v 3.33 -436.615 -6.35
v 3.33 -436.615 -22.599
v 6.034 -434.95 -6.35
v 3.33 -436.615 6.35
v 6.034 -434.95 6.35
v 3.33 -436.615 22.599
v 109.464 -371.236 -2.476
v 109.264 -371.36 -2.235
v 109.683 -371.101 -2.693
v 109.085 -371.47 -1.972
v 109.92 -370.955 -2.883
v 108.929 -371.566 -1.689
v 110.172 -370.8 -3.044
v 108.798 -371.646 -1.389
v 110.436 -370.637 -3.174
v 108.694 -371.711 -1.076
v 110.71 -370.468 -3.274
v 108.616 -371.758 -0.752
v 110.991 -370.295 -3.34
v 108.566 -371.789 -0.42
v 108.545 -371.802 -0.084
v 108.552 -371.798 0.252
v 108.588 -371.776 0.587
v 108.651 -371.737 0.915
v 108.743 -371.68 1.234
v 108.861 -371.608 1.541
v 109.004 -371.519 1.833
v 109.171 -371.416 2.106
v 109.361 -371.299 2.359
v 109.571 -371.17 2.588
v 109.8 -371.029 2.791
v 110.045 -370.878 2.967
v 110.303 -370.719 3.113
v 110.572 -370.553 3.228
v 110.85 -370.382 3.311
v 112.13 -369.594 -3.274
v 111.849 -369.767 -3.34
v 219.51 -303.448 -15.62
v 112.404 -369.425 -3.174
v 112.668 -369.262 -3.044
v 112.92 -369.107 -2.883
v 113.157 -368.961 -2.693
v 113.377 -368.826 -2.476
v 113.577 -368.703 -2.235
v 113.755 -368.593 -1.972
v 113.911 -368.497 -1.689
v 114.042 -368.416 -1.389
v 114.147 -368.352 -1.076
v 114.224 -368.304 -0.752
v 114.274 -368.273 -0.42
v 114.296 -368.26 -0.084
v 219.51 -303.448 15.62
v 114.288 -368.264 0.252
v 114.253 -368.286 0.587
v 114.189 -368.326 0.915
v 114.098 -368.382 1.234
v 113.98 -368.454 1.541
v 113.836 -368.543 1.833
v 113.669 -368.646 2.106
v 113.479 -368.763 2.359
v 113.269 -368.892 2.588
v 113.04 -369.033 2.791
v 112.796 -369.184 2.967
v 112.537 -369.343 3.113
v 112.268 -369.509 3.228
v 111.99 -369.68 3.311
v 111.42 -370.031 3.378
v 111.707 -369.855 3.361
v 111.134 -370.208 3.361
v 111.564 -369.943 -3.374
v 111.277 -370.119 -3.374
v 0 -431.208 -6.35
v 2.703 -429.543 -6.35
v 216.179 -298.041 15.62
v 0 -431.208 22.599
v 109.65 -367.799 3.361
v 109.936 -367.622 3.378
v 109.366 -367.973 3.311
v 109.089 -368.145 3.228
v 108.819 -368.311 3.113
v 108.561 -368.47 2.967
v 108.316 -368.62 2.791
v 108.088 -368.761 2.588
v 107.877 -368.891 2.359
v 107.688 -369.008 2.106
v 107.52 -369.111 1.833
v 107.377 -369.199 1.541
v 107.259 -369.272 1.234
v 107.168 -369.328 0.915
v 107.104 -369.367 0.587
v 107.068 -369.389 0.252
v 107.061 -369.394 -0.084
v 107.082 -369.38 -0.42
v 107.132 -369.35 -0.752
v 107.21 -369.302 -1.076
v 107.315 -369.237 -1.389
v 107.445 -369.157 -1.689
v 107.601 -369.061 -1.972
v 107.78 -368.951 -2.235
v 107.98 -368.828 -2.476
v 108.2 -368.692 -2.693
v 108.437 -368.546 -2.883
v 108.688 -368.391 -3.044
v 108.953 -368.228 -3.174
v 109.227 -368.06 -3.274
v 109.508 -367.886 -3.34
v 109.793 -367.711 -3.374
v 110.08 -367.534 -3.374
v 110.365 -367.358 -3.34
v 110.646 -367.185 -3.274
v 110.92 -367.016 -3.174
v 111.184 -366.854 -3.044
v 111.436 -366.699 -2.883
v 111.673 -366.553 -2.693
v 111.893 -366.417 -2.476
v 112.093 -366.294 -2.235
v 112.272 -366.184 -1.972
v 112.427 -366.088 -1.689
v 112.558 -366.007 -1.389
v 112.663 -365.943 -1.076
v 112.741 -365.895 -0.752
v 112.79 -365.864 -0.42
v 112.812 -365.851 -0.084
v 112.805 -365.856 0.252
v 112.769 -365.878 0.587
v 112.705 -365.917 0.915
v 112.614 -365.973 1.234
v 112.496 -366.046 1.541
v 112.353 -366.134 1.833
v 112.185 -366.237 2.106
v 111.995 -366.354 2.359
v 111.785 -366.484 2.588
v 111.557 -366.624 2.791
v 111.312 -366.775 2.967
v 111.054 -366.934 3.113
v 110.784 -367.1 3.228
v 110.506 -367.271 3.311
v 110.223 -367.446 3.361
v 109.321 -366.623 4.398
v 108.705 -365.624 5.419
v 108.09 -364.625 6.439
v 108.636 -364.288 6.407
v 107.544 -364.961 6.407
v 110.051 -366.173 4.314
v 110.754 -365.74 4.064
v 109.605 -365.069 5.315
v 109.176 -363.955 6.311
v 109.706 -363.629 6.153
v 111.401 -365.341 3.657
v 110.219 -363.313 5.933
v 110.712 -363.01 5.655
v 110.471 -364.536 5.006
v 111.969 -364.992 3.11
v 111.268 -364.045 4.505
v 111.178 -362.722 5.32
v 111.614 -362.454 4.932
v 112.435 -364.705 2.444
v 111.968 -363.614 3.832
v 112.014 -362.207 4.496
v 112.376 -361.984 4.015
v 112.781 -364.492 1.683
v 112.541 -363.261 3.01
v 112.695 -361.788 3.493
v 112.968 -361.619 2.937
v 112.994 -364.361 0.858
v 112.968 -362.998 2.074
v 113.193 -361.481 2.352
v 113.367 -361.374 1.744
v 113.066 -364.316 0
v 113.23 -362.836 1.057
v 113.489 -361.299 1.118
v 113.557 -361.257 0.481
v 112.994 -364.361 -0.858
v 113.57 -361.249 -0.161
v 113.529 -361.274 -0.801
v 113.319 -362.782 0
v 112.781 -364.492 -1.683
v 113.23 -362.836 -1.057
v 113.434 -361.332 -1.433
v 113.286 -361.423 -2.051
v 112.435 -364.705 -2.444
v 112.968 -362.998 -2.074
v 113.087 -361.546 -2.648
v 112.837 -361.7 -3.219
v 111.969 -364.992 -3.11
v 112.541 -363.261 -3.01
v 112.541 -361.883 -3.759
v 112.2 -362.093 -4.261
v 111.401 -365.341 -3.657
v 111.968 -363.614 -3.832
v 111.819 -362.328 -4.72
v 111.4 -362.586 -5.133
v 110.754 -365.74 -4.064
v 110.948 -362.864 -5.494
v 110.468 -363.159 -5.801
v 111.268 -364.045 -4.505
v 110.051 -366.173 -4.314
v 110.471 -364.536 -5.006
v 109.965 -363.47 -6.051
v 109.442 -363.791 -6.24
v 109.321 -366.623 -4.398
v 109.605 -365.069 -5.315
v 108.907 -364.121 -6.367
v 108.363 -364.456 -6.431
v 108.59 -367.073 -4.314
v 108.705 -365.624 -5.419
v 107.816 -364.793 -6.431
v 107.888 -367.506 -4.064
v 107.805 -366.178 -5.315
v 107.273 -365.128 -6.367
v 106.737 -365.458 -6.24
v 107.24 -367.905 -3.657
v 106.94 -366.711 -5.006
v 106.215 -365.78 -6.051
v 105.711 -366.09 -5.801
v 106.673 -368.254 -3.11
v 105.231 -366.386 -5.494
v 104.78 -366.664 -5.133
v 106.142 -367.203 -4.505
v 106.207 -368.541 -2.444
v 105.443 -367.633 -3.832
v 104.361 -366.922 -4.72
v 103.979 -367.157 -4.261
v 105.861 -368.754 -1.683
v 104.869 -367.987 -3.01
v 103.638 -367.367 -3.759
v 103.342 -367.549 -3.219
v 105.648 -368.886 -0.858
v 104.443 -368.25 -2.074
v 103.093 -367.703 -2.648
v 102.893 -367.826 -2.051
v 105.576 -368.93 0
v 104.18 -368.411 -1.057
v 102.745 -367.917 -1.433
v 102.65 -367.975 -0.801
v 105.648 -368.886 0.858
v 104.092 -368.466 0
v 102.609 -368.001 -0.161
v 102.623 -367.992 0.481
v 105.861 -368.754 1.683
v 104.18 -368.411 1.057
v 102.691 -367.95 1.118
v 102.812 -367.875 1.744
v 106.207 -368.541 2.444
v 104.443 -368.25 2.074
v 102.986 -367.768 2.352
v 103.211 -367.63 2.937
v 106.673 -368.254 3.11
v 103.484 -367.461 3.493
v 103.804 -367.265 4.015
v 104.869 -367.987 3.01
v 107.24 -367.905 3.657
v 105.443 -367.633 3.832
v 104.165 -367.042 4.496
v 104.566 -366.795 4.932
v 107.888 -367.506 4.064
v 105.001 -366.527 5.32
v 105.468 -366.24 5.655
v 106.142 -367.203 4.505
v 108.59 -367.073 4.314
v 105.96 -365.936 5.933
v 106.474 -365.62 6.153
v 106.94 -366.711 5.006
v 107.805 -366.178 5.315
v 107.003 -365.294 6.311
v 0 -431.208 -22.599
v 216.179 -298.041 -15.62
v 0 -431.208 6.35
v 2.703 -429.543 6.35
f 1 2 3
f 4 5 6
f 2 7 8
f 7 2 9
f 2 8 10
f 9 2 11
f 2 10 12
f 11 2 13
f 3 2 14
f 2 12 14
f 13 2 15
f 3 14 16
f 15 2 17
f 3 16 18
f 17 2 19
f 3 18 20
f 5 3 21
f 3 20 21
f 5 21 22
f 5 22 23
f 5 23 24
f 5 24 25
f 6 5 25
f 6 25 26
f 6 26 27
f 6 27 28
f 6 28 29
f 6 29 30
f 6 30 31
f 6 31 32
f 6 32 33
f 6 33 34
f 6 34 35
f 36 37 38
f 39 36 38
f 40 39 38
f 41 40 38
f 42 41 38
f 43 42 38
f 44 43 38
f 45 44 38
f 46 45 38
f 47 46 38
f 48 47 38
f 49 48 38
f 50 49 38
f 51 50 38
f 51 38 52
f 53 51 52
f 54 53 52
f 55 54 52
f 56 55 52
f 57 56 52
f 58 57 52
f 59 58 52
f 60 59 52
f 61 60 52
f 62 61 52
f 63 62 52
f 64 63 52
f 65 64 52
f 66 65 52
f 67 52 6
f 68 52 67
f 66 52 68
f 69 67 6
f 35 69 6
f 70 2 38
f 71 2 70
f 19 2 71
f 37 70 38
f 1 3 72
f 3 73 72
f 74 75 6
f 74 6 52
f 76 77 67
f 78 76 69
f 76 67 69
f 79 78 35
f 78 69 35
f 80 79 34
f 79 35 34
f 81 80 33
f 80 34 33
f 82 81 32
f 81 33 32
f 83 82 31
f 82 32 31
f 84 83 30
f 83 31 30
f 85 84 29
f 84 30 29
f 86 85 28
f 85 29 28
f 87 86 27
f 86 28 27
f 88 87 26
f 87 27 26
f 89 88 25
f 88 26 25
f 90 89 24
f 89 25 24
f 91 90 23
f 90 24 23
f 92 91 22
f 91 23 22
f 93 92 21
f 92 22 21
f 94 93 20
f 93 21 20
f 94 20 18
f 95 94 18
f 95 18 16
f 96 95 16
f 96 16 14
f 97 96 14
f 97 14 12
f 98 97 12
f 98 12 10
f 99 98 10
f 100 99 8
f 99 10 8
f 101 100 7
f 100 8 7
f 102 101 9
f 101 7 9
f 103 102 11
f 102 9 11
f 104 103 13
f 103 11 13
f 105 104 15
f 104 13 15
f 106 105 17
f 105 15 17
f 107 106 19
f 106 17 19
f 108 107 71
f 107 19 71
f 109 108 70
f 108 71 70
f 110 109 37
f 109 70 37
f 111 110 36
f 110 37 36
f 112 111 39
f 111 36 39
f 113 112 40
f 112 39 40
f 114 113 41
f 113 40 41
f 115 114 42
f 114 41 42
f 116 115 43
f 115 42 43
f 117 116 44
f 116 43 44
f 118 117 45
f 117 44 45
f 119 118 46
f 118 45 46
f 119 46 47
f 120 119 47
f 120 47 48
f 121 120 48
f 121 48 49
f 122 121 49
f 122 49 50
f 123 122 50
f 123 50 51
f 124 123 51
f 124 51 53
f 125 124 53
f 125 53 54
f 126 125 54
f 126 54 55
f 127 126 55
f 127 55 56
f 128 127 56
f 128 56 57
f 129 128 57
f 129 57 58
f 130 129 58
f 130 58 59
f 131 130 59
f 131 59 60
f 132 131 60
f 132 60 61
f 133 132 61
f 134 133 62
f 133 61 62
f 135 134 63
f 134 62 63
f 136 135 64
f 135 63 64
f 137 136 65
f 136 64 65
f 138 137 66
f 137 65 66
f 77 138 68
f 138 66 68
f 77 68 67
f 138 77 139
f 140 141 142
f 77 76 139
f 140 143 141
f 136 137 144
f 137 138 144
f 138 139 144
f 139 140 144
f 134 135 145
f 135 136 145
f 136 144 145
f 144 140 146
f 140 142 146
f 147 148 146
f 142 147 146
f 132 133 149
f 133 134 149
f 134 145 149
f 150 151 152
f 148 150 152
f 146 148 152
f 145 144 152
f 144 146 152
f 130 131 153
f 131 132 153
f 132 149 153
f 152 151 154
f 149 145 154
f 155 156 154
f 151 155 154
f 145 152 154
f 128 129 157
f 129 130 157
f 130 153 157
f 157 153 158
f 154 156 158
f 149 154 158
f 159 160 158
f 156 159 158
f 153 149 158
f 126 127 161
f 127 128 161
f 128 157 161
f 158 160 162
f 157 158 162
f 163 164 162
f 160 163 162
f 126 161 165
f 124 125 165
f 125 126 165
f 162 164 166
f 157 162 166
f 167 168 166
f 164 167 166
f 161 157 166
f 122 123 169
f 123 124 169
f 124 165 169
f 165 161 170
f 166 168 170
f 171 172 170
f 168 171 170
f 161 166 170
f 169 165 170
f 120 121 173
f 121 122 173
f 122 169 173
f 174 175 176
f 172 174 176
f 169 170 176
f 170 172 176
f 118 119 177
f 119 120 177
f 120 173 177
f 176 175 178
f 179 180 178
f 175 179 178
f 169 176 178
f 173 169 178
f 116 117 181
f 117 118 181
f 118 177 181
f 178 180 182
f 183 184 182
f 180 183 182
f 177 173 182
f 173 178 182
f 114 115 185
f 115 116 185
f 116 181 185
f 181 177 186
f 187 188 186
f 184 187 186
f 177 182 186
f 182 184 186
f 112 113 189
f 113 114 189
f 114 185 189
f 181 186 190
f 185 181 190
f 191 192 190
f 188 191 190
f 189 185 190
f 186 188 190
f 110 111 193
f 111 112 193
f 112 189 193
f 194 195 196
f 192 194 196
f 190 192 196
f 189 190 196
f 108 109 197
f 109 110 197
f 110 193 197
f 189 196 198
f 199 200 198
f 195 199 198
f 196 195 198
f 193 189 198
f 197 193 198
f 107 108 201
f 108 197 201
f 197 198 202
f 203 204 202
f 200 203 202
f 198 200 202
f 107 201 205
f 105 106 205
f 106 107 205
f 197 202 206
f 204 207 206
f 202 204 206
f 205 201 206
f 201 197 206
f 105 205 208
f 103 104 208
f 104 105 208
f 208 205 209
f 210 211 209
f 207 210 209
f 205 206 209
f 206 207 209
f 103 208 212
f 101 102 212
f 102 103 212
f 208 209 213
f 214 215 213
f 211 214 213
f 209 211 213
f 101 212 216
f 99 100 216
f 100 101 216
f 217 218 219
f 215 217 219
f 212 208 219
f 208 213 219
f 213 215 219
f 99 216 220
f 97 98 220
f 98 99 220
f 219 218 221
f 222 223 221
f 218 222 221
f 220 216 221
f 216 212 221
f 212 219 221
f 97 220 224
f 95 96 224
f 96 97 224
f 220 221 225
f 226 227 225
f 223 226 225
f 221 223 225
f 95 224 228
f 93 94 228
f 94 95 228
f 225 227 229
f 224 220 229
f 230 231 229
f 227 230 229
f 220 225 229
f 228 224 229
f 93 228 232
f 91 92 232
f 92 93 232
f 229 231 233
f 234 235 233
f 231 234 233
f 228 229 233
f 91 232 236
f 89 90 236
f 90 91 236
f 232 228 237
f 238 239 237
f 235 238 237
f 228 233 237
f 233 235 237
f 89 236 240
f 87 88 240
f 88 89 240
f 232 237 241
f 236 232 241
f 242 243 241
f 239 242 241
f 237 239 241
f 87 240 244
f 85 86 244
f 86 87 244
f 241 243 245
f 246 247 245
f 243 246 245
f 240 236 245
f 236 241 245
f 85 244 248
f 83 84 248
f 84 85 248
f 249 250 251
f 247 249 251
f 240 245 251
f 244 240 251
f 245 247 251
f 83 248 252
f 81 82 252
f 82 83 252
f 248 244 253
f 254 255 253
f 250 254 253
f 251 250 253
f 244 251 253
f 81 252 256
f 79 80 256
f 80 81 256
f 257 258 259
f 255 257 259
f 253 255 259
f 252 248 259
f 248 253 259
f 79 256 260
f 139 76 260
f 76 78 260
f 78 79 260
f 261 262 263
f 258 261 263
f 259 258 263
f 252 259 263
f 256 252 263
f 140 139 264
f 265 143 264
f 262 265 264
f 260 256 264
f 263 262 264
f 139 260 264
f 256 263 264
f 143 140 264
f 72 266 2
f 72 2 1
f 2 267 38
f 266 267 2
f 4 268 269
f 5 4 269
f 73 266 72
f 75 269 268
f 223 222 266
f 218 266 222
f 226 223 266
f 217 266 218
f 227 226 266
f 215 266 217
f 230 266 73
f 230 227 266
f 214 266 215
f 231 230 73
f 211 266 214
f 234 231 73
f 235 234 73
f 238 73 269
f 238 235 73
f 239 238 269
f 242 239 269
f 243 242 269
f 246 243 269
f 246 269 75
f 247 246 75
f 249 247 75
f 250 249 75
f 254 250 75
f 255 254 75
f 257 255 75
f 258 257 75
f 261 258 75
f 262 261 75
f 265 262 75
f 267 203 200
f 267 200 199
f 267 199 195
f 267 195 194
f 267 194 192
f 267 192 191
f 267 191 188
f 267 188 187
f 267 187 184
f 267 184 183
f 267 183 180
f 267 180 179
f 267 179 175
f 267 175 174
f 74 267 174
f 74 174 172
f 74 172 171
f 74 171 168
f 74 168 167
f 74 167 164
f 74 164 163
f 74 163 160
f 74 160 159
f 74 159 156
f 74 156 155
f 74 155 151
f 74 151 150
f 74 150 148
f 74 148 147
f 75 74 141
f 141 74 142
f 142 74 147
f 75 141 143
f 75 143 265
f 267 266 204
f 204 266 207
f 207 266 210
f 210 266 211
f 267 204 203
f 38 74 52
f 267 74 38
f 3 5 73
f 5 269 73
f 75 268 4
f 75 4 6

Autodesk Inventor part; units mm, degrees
ref_plane "XZ Plane" through (0, 0, 0) normal (0, 1, 0) x (-1, 0, 0)
sketch "Sketch1" plane through (0, 0, 0) normal (1, 0, 0) x (0, 1, 0)
  circle A0 centre (0, 0) radius 431.8 construction
  line L0 (-431.2082, -22.5987) -> (-431.2082, 22.5987)
  line L1 (-431.2082, -22.5987) -> (-386.0109, -22.5987) construction
  line L2 (-431.2082, -22.5987) -> (0, 0) construction
  line L3 (0, 0) -> (-431.2082, 22.5987) construction
  dimension "d0" = 863.6
  dimension "d3" = 90
  dimension "d4" = 6
ref_plane "Work Plane1" through (216.1794, 0, 0) normal (1, 0, 0) x (0, 1, 0)
sketch "Sketch2" plane through (216.1794, 0, 0) normal (1, 0, 0) x (0, 1, 0)
  circle A0 centre (0, 0) radius 298.45 construction
  line L0 (-298.041, 15.6197) -> (-298.041, -15.6197)
  line L1 (-298.041, 15.6197) -> (-266.8017, 15.6197) construction
  line L2 (-298.041, 15.6197) -> (0, 0) construction
  line L3 (0, 0) -> (-298.041, -15.6197) construction
  dimension "d2" = 596.9
  dimension "d5" = 90
  dimension "d6" = 6
ref_plane "Work Plane2" through (0, -431.2082, -22.5987) normal (-0.5244795, 0.8514231, 0) x (0, 0, 1)
sketch "Sketch3" plane through (0, -431.2082, -22.5987) normal (-0.5244795, 0.8514231, 0) x (0, 0, 1)
  line L0 (0, 0) -> (45.1973, 0) projected
  line L1 (38.2183, 253.9036) -> (6.979, 253.9036) projected
  line L2 (6.979, 253.9036) -> (0, 0)
  line L3 (45.1973, 0) -> (38.2183, 253.9036)
  point P0 (22.5987, 226.1599)
extrude "Extrusion1" add sketch "Sketch3" against normal blind 6.35
sketch "Sketch5" plane through (0, -431.2082, -22.5987) normal (-0.5244795, 0.8514231, 0) x (0.8514231, 0.5244795, 0)
  line L0 (-3.175, -28.9487) -> (3.175, -28.9487)
  line L1 (3.175, -28.9487) -> (3.175, -16.2487)
  line L2 (3.175, -16.2487) -> (-3.175, -16.2487)
  line L3 (-3.175, -16.2487) -> (-3.175, -28.9487)
  line L4 (0, -45.1973) -> (0, 0) projected
  line L5 (-3.175, -28.9487) -> (3.175, -16.2487) construction
  line L6 (3.175, -28.9487) -> (-3.175, -16.2487) construction
  point P0 (226.1599, -22.5987)
  point P1 (0, -22.5987)
  point P2 (0, -28.9487)
  point P3 (0, -16.2487)
  dimension "d17" = 6.35
  dimension "d18" = 12.7
extrude "Extrusion3" cut sketch "Sketch5" against normal through all
sketch "Sketch6" plane through (0, -431.2082, -22.5987) normal (-0.5244795, 0.8514231, 0) x (0.8514231, 0.5244795, 0)
  line L0 (253.9036, -38.2183) -> (253.9036, -6.979) projected
  line L1 (0, 0) -> (0, -16.2487) projected
  line L2 (253.9036, -6.979) -> (253.9036, -38.2183) projected
  line L3 (253.9036, -22.5987) -> (3.175, -22.5987) construction
  line L4 (3.175, -16.2487) -> (3.175, -28.9487) projected
  point P0 (226.1599, -22.5987)
  point P1 (126.9518, -22.5987)
  dimension "d21" = 253.9036
  dimension "d22" = 126.9518
hole "Hole1" at (108.0897, -364.6246, 0) direction (0.5244795, -0.8514231, 0) diameter 6.7564 end through all countersink diameter 12.8778 countersink angle 82 clearance for "Flat Head Machine Screw (82)" size "1/4" standard "Ansi Unified Screw Threads"
equation "\"d22\" = 0.5 * d21"
properties part number "Touch Fifth" material "Polycarbonate, Clear"
